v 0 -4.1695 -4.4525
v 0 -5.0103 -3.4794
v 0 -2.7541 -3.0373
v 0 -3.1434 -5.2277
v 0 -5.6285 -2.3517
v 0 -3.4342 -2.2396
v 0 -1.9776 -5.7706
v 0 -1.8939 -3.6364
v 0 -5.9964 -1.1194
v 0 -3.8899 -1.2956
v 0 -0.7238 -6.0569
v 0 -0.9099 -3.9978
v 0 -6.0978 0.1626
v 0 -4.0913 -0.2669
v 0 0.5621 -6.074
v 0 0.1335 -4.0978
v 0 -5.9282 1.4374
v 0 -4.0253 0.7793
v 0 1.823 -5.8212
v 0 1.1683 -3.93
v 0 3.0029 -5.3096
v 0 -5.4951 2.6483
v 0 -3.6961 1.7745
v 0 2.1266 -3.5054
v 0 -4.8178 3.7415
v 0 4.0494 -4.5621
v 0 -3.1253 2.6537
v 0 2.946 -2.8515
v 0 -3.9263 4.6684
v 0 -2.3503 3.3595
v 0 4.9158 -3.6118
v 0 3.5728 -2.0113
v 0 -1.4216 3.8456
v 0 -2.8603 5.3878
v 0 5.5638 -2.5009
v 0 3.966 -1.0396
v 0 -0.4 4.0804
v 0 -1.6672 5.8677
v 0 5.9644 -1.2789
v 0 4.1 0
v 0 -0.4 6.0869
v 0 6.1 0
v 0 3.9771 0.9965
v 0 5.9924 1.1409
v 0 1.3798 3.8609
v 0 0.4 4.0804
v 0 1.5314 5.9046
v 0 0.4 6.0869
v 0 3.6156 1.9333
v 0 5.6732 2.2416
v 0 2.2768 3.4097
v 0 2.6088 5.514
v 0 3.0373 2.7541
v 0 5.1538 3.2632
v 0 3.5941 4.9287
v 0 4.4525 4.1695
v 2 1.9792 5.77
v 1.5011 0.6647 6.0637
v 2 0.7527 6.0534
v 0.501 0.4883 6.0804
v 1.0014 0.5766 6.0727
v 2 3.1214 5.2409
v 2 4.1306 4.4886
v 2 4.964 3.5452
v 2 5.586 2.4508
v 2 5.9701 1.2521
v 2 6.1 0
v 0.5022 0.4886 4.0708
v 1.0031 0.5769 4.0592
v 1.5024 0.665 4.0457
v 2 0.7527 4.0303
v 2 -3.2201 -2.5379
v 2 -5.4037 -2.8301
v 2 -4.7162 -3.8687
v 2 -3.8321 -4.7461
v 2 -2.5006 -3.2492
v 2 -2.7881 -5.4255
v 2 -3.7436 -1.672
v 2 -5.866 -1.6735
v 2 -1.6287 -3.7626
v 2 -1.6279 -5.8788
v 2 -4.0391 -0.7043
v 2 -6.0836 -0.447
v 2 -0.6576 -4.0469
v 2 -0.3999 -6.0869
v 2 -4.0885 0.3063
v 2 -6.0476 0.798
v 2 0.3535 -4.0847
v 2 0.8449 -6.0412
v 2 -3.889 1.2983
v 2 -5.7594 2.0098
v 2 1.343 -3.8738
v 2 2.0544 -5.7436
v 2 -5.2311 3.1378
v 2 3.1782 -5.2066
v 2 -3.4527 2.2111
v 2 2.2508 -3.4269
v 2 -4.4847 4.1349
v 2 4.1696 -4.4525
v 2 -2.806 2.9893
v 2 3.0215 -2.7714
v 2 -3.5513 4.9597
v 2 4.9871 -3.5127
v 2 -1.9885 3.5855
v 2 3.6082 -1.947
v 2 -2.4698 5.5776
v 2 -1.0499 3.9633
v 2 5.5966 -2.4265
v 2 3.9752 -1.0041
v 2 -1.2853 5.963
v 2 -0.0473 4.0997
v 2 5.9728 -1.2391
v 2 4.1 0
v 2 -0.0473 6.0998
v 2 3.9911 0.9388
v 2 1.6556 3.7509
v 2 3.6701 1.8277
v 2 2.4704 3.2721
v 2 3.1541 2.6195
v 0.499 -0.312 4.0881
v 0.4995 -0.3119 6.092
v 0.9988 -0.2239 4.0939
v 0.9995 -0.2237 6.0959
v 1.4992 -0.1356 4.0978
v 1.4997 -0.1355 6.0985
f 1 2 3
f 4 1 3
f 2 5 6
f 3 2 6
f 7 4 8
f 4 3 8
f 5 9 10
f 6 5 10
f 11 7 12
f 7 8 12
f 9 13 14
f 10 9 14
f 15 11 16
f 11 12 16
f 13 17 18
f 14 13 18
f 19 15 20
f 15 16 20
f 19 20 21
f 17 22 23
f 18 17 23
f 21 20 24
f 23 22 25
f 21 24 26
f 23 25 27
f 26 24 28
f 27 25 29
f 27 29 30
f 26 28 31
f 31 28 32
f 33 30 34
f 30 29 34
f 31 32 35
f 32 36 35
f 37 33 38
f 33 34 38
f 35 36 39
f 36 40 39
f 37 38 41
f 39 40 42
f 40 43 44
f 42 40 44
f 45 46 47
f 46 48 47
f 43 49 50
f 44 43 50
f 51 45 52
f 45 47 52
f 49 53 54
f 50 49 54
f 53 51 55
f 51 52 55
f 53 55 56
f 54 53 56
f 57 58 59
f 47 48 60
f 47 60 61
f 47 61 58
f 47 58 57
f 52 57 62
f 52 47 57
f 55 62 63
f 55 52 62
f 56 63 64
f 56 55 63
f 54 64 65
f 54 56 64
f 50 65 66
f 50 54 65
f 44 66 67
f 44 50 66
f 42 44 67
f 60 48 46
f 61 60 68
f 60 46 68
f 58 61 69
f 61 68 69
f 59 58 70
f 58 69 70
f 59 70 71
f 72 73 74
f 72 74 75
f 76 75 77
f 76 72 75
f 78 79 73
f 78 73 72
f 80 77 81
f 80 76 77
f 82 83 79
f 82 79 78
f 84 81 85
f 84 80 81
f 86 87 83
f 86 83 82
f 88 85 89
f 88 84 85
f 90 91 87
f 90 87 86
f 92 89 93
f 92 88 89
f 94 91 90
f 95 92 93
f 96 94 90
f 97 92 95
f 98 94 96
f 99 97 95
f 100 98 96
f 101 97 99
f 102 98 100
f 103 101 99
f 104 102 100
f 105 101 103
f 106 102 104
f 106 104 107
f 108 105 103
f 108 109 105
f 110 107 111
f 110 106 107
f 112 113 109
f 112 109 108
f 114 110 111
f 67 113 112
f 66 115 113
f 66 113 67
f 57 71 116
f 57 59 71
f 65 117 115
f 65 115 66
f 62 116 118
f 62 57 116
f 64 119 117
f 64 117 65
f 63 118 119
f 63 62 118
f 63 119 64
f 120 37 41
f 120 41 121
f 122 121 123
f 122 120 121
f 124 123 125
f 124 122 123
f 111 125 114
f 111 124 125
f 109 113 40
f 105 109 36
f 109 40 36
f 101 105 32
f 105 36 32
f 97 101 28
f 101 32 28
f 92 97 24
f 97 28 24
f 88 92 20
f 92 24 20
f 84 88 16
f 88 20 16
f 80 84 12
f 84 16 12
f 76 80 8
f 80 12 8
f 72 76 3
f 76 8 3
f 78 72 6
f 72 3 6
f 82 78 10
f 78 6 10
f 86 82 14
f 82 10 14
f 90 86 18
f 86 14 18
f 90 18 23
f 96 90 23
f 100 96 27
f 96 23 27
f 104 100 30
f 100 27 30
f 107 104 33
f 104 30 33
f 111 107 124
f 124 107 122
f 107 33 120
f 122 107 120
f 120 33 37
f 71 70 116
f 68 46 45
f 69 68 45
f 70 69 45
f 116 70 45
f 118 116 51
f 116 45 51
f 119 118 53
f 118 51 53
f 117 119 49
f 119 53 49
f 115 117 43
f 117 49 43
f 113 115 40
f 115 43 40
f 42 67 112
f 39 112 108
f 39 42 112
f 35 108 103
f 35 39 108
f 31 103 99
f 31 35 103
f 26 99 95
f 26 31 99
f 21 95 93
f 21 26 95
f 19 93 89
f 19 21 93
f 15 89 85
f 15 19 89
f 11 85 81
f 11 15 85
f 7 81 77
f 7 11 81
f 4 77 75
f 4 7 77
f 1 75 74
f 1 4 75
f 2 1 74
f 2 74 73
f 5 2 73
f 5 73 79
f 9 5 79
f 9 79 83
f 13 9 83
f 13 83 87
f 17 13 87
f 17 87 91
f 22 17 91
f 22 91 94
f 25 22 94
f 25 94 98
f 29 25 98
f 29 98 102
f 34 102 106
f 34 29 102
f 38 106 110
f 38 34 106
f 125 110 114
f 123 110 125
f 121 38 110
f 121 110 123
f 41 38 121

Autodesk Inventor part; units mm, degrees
ref_plane "YZ Plane" through (0, 0, 0) normal (1, 0, 0) x (0, 1, 0)
ref_plane "XZ Plane" through (0, 0, 0) normal (0, 1, 0) x (-1, 0, 0)
sketch "Náčrt1" plane through (0, 0, 0) normal (1, 0, 0) x (0, 1, 0)
  circle A0 centre (0, 0) radius 6.1
  circle A1 centre (0, 0) radius 4.1
  dimension "d0" = 8.2
  dimension "d1" = 12.2
extrude "Těleso" add sketch "Náčrt1" along normal blind 2
sketch "Náčrt2" plane through (0, 0, 0) normal (0, 0, 1) x (1, 0, 0)
  line L0 (0, -4.1) -> (0, 4.1) projected
  line L1 (2, 6.1) -> (2, -6.1) projected
  line L2 (-1.2, 0) -> (7.2, 0) projected
  line L3 (0, -0.4) -> (2, -0.0473)
  line L4 (0, 0.4) -> (2, 0.7527)
  dimension "d4" = 0.4
  dimension "d5" = 0.4
  dimension "d6" = 80
extrude "Výřez" cut sketch "Náčrt2" along normal up to next
ref_plane "Work Plane1" through (0, 0, 0) normal (0, -1, 0) x (1, 0, 0)
equation "\"d0\" = SD1"
equation "\"d1\" = SD2"
equation "\"d2\" = SD"
equation "\"d4\" = 0.2 * SD"
equation "\"d5\" = 0.2 * SD"
equation "\"d6\" = FAWI"
equation "\"d7\" = SD"
equation "\"SD1\" = 8.2"
equation "\"SD2\" = 12.2"
equation "\"SD\" = 2"
equation "\"FAWI\" = 80deg"
equation "\"NND\" = 8"
properties part number "CSN 02 1740 - 8" material "Nerezová ocel"
